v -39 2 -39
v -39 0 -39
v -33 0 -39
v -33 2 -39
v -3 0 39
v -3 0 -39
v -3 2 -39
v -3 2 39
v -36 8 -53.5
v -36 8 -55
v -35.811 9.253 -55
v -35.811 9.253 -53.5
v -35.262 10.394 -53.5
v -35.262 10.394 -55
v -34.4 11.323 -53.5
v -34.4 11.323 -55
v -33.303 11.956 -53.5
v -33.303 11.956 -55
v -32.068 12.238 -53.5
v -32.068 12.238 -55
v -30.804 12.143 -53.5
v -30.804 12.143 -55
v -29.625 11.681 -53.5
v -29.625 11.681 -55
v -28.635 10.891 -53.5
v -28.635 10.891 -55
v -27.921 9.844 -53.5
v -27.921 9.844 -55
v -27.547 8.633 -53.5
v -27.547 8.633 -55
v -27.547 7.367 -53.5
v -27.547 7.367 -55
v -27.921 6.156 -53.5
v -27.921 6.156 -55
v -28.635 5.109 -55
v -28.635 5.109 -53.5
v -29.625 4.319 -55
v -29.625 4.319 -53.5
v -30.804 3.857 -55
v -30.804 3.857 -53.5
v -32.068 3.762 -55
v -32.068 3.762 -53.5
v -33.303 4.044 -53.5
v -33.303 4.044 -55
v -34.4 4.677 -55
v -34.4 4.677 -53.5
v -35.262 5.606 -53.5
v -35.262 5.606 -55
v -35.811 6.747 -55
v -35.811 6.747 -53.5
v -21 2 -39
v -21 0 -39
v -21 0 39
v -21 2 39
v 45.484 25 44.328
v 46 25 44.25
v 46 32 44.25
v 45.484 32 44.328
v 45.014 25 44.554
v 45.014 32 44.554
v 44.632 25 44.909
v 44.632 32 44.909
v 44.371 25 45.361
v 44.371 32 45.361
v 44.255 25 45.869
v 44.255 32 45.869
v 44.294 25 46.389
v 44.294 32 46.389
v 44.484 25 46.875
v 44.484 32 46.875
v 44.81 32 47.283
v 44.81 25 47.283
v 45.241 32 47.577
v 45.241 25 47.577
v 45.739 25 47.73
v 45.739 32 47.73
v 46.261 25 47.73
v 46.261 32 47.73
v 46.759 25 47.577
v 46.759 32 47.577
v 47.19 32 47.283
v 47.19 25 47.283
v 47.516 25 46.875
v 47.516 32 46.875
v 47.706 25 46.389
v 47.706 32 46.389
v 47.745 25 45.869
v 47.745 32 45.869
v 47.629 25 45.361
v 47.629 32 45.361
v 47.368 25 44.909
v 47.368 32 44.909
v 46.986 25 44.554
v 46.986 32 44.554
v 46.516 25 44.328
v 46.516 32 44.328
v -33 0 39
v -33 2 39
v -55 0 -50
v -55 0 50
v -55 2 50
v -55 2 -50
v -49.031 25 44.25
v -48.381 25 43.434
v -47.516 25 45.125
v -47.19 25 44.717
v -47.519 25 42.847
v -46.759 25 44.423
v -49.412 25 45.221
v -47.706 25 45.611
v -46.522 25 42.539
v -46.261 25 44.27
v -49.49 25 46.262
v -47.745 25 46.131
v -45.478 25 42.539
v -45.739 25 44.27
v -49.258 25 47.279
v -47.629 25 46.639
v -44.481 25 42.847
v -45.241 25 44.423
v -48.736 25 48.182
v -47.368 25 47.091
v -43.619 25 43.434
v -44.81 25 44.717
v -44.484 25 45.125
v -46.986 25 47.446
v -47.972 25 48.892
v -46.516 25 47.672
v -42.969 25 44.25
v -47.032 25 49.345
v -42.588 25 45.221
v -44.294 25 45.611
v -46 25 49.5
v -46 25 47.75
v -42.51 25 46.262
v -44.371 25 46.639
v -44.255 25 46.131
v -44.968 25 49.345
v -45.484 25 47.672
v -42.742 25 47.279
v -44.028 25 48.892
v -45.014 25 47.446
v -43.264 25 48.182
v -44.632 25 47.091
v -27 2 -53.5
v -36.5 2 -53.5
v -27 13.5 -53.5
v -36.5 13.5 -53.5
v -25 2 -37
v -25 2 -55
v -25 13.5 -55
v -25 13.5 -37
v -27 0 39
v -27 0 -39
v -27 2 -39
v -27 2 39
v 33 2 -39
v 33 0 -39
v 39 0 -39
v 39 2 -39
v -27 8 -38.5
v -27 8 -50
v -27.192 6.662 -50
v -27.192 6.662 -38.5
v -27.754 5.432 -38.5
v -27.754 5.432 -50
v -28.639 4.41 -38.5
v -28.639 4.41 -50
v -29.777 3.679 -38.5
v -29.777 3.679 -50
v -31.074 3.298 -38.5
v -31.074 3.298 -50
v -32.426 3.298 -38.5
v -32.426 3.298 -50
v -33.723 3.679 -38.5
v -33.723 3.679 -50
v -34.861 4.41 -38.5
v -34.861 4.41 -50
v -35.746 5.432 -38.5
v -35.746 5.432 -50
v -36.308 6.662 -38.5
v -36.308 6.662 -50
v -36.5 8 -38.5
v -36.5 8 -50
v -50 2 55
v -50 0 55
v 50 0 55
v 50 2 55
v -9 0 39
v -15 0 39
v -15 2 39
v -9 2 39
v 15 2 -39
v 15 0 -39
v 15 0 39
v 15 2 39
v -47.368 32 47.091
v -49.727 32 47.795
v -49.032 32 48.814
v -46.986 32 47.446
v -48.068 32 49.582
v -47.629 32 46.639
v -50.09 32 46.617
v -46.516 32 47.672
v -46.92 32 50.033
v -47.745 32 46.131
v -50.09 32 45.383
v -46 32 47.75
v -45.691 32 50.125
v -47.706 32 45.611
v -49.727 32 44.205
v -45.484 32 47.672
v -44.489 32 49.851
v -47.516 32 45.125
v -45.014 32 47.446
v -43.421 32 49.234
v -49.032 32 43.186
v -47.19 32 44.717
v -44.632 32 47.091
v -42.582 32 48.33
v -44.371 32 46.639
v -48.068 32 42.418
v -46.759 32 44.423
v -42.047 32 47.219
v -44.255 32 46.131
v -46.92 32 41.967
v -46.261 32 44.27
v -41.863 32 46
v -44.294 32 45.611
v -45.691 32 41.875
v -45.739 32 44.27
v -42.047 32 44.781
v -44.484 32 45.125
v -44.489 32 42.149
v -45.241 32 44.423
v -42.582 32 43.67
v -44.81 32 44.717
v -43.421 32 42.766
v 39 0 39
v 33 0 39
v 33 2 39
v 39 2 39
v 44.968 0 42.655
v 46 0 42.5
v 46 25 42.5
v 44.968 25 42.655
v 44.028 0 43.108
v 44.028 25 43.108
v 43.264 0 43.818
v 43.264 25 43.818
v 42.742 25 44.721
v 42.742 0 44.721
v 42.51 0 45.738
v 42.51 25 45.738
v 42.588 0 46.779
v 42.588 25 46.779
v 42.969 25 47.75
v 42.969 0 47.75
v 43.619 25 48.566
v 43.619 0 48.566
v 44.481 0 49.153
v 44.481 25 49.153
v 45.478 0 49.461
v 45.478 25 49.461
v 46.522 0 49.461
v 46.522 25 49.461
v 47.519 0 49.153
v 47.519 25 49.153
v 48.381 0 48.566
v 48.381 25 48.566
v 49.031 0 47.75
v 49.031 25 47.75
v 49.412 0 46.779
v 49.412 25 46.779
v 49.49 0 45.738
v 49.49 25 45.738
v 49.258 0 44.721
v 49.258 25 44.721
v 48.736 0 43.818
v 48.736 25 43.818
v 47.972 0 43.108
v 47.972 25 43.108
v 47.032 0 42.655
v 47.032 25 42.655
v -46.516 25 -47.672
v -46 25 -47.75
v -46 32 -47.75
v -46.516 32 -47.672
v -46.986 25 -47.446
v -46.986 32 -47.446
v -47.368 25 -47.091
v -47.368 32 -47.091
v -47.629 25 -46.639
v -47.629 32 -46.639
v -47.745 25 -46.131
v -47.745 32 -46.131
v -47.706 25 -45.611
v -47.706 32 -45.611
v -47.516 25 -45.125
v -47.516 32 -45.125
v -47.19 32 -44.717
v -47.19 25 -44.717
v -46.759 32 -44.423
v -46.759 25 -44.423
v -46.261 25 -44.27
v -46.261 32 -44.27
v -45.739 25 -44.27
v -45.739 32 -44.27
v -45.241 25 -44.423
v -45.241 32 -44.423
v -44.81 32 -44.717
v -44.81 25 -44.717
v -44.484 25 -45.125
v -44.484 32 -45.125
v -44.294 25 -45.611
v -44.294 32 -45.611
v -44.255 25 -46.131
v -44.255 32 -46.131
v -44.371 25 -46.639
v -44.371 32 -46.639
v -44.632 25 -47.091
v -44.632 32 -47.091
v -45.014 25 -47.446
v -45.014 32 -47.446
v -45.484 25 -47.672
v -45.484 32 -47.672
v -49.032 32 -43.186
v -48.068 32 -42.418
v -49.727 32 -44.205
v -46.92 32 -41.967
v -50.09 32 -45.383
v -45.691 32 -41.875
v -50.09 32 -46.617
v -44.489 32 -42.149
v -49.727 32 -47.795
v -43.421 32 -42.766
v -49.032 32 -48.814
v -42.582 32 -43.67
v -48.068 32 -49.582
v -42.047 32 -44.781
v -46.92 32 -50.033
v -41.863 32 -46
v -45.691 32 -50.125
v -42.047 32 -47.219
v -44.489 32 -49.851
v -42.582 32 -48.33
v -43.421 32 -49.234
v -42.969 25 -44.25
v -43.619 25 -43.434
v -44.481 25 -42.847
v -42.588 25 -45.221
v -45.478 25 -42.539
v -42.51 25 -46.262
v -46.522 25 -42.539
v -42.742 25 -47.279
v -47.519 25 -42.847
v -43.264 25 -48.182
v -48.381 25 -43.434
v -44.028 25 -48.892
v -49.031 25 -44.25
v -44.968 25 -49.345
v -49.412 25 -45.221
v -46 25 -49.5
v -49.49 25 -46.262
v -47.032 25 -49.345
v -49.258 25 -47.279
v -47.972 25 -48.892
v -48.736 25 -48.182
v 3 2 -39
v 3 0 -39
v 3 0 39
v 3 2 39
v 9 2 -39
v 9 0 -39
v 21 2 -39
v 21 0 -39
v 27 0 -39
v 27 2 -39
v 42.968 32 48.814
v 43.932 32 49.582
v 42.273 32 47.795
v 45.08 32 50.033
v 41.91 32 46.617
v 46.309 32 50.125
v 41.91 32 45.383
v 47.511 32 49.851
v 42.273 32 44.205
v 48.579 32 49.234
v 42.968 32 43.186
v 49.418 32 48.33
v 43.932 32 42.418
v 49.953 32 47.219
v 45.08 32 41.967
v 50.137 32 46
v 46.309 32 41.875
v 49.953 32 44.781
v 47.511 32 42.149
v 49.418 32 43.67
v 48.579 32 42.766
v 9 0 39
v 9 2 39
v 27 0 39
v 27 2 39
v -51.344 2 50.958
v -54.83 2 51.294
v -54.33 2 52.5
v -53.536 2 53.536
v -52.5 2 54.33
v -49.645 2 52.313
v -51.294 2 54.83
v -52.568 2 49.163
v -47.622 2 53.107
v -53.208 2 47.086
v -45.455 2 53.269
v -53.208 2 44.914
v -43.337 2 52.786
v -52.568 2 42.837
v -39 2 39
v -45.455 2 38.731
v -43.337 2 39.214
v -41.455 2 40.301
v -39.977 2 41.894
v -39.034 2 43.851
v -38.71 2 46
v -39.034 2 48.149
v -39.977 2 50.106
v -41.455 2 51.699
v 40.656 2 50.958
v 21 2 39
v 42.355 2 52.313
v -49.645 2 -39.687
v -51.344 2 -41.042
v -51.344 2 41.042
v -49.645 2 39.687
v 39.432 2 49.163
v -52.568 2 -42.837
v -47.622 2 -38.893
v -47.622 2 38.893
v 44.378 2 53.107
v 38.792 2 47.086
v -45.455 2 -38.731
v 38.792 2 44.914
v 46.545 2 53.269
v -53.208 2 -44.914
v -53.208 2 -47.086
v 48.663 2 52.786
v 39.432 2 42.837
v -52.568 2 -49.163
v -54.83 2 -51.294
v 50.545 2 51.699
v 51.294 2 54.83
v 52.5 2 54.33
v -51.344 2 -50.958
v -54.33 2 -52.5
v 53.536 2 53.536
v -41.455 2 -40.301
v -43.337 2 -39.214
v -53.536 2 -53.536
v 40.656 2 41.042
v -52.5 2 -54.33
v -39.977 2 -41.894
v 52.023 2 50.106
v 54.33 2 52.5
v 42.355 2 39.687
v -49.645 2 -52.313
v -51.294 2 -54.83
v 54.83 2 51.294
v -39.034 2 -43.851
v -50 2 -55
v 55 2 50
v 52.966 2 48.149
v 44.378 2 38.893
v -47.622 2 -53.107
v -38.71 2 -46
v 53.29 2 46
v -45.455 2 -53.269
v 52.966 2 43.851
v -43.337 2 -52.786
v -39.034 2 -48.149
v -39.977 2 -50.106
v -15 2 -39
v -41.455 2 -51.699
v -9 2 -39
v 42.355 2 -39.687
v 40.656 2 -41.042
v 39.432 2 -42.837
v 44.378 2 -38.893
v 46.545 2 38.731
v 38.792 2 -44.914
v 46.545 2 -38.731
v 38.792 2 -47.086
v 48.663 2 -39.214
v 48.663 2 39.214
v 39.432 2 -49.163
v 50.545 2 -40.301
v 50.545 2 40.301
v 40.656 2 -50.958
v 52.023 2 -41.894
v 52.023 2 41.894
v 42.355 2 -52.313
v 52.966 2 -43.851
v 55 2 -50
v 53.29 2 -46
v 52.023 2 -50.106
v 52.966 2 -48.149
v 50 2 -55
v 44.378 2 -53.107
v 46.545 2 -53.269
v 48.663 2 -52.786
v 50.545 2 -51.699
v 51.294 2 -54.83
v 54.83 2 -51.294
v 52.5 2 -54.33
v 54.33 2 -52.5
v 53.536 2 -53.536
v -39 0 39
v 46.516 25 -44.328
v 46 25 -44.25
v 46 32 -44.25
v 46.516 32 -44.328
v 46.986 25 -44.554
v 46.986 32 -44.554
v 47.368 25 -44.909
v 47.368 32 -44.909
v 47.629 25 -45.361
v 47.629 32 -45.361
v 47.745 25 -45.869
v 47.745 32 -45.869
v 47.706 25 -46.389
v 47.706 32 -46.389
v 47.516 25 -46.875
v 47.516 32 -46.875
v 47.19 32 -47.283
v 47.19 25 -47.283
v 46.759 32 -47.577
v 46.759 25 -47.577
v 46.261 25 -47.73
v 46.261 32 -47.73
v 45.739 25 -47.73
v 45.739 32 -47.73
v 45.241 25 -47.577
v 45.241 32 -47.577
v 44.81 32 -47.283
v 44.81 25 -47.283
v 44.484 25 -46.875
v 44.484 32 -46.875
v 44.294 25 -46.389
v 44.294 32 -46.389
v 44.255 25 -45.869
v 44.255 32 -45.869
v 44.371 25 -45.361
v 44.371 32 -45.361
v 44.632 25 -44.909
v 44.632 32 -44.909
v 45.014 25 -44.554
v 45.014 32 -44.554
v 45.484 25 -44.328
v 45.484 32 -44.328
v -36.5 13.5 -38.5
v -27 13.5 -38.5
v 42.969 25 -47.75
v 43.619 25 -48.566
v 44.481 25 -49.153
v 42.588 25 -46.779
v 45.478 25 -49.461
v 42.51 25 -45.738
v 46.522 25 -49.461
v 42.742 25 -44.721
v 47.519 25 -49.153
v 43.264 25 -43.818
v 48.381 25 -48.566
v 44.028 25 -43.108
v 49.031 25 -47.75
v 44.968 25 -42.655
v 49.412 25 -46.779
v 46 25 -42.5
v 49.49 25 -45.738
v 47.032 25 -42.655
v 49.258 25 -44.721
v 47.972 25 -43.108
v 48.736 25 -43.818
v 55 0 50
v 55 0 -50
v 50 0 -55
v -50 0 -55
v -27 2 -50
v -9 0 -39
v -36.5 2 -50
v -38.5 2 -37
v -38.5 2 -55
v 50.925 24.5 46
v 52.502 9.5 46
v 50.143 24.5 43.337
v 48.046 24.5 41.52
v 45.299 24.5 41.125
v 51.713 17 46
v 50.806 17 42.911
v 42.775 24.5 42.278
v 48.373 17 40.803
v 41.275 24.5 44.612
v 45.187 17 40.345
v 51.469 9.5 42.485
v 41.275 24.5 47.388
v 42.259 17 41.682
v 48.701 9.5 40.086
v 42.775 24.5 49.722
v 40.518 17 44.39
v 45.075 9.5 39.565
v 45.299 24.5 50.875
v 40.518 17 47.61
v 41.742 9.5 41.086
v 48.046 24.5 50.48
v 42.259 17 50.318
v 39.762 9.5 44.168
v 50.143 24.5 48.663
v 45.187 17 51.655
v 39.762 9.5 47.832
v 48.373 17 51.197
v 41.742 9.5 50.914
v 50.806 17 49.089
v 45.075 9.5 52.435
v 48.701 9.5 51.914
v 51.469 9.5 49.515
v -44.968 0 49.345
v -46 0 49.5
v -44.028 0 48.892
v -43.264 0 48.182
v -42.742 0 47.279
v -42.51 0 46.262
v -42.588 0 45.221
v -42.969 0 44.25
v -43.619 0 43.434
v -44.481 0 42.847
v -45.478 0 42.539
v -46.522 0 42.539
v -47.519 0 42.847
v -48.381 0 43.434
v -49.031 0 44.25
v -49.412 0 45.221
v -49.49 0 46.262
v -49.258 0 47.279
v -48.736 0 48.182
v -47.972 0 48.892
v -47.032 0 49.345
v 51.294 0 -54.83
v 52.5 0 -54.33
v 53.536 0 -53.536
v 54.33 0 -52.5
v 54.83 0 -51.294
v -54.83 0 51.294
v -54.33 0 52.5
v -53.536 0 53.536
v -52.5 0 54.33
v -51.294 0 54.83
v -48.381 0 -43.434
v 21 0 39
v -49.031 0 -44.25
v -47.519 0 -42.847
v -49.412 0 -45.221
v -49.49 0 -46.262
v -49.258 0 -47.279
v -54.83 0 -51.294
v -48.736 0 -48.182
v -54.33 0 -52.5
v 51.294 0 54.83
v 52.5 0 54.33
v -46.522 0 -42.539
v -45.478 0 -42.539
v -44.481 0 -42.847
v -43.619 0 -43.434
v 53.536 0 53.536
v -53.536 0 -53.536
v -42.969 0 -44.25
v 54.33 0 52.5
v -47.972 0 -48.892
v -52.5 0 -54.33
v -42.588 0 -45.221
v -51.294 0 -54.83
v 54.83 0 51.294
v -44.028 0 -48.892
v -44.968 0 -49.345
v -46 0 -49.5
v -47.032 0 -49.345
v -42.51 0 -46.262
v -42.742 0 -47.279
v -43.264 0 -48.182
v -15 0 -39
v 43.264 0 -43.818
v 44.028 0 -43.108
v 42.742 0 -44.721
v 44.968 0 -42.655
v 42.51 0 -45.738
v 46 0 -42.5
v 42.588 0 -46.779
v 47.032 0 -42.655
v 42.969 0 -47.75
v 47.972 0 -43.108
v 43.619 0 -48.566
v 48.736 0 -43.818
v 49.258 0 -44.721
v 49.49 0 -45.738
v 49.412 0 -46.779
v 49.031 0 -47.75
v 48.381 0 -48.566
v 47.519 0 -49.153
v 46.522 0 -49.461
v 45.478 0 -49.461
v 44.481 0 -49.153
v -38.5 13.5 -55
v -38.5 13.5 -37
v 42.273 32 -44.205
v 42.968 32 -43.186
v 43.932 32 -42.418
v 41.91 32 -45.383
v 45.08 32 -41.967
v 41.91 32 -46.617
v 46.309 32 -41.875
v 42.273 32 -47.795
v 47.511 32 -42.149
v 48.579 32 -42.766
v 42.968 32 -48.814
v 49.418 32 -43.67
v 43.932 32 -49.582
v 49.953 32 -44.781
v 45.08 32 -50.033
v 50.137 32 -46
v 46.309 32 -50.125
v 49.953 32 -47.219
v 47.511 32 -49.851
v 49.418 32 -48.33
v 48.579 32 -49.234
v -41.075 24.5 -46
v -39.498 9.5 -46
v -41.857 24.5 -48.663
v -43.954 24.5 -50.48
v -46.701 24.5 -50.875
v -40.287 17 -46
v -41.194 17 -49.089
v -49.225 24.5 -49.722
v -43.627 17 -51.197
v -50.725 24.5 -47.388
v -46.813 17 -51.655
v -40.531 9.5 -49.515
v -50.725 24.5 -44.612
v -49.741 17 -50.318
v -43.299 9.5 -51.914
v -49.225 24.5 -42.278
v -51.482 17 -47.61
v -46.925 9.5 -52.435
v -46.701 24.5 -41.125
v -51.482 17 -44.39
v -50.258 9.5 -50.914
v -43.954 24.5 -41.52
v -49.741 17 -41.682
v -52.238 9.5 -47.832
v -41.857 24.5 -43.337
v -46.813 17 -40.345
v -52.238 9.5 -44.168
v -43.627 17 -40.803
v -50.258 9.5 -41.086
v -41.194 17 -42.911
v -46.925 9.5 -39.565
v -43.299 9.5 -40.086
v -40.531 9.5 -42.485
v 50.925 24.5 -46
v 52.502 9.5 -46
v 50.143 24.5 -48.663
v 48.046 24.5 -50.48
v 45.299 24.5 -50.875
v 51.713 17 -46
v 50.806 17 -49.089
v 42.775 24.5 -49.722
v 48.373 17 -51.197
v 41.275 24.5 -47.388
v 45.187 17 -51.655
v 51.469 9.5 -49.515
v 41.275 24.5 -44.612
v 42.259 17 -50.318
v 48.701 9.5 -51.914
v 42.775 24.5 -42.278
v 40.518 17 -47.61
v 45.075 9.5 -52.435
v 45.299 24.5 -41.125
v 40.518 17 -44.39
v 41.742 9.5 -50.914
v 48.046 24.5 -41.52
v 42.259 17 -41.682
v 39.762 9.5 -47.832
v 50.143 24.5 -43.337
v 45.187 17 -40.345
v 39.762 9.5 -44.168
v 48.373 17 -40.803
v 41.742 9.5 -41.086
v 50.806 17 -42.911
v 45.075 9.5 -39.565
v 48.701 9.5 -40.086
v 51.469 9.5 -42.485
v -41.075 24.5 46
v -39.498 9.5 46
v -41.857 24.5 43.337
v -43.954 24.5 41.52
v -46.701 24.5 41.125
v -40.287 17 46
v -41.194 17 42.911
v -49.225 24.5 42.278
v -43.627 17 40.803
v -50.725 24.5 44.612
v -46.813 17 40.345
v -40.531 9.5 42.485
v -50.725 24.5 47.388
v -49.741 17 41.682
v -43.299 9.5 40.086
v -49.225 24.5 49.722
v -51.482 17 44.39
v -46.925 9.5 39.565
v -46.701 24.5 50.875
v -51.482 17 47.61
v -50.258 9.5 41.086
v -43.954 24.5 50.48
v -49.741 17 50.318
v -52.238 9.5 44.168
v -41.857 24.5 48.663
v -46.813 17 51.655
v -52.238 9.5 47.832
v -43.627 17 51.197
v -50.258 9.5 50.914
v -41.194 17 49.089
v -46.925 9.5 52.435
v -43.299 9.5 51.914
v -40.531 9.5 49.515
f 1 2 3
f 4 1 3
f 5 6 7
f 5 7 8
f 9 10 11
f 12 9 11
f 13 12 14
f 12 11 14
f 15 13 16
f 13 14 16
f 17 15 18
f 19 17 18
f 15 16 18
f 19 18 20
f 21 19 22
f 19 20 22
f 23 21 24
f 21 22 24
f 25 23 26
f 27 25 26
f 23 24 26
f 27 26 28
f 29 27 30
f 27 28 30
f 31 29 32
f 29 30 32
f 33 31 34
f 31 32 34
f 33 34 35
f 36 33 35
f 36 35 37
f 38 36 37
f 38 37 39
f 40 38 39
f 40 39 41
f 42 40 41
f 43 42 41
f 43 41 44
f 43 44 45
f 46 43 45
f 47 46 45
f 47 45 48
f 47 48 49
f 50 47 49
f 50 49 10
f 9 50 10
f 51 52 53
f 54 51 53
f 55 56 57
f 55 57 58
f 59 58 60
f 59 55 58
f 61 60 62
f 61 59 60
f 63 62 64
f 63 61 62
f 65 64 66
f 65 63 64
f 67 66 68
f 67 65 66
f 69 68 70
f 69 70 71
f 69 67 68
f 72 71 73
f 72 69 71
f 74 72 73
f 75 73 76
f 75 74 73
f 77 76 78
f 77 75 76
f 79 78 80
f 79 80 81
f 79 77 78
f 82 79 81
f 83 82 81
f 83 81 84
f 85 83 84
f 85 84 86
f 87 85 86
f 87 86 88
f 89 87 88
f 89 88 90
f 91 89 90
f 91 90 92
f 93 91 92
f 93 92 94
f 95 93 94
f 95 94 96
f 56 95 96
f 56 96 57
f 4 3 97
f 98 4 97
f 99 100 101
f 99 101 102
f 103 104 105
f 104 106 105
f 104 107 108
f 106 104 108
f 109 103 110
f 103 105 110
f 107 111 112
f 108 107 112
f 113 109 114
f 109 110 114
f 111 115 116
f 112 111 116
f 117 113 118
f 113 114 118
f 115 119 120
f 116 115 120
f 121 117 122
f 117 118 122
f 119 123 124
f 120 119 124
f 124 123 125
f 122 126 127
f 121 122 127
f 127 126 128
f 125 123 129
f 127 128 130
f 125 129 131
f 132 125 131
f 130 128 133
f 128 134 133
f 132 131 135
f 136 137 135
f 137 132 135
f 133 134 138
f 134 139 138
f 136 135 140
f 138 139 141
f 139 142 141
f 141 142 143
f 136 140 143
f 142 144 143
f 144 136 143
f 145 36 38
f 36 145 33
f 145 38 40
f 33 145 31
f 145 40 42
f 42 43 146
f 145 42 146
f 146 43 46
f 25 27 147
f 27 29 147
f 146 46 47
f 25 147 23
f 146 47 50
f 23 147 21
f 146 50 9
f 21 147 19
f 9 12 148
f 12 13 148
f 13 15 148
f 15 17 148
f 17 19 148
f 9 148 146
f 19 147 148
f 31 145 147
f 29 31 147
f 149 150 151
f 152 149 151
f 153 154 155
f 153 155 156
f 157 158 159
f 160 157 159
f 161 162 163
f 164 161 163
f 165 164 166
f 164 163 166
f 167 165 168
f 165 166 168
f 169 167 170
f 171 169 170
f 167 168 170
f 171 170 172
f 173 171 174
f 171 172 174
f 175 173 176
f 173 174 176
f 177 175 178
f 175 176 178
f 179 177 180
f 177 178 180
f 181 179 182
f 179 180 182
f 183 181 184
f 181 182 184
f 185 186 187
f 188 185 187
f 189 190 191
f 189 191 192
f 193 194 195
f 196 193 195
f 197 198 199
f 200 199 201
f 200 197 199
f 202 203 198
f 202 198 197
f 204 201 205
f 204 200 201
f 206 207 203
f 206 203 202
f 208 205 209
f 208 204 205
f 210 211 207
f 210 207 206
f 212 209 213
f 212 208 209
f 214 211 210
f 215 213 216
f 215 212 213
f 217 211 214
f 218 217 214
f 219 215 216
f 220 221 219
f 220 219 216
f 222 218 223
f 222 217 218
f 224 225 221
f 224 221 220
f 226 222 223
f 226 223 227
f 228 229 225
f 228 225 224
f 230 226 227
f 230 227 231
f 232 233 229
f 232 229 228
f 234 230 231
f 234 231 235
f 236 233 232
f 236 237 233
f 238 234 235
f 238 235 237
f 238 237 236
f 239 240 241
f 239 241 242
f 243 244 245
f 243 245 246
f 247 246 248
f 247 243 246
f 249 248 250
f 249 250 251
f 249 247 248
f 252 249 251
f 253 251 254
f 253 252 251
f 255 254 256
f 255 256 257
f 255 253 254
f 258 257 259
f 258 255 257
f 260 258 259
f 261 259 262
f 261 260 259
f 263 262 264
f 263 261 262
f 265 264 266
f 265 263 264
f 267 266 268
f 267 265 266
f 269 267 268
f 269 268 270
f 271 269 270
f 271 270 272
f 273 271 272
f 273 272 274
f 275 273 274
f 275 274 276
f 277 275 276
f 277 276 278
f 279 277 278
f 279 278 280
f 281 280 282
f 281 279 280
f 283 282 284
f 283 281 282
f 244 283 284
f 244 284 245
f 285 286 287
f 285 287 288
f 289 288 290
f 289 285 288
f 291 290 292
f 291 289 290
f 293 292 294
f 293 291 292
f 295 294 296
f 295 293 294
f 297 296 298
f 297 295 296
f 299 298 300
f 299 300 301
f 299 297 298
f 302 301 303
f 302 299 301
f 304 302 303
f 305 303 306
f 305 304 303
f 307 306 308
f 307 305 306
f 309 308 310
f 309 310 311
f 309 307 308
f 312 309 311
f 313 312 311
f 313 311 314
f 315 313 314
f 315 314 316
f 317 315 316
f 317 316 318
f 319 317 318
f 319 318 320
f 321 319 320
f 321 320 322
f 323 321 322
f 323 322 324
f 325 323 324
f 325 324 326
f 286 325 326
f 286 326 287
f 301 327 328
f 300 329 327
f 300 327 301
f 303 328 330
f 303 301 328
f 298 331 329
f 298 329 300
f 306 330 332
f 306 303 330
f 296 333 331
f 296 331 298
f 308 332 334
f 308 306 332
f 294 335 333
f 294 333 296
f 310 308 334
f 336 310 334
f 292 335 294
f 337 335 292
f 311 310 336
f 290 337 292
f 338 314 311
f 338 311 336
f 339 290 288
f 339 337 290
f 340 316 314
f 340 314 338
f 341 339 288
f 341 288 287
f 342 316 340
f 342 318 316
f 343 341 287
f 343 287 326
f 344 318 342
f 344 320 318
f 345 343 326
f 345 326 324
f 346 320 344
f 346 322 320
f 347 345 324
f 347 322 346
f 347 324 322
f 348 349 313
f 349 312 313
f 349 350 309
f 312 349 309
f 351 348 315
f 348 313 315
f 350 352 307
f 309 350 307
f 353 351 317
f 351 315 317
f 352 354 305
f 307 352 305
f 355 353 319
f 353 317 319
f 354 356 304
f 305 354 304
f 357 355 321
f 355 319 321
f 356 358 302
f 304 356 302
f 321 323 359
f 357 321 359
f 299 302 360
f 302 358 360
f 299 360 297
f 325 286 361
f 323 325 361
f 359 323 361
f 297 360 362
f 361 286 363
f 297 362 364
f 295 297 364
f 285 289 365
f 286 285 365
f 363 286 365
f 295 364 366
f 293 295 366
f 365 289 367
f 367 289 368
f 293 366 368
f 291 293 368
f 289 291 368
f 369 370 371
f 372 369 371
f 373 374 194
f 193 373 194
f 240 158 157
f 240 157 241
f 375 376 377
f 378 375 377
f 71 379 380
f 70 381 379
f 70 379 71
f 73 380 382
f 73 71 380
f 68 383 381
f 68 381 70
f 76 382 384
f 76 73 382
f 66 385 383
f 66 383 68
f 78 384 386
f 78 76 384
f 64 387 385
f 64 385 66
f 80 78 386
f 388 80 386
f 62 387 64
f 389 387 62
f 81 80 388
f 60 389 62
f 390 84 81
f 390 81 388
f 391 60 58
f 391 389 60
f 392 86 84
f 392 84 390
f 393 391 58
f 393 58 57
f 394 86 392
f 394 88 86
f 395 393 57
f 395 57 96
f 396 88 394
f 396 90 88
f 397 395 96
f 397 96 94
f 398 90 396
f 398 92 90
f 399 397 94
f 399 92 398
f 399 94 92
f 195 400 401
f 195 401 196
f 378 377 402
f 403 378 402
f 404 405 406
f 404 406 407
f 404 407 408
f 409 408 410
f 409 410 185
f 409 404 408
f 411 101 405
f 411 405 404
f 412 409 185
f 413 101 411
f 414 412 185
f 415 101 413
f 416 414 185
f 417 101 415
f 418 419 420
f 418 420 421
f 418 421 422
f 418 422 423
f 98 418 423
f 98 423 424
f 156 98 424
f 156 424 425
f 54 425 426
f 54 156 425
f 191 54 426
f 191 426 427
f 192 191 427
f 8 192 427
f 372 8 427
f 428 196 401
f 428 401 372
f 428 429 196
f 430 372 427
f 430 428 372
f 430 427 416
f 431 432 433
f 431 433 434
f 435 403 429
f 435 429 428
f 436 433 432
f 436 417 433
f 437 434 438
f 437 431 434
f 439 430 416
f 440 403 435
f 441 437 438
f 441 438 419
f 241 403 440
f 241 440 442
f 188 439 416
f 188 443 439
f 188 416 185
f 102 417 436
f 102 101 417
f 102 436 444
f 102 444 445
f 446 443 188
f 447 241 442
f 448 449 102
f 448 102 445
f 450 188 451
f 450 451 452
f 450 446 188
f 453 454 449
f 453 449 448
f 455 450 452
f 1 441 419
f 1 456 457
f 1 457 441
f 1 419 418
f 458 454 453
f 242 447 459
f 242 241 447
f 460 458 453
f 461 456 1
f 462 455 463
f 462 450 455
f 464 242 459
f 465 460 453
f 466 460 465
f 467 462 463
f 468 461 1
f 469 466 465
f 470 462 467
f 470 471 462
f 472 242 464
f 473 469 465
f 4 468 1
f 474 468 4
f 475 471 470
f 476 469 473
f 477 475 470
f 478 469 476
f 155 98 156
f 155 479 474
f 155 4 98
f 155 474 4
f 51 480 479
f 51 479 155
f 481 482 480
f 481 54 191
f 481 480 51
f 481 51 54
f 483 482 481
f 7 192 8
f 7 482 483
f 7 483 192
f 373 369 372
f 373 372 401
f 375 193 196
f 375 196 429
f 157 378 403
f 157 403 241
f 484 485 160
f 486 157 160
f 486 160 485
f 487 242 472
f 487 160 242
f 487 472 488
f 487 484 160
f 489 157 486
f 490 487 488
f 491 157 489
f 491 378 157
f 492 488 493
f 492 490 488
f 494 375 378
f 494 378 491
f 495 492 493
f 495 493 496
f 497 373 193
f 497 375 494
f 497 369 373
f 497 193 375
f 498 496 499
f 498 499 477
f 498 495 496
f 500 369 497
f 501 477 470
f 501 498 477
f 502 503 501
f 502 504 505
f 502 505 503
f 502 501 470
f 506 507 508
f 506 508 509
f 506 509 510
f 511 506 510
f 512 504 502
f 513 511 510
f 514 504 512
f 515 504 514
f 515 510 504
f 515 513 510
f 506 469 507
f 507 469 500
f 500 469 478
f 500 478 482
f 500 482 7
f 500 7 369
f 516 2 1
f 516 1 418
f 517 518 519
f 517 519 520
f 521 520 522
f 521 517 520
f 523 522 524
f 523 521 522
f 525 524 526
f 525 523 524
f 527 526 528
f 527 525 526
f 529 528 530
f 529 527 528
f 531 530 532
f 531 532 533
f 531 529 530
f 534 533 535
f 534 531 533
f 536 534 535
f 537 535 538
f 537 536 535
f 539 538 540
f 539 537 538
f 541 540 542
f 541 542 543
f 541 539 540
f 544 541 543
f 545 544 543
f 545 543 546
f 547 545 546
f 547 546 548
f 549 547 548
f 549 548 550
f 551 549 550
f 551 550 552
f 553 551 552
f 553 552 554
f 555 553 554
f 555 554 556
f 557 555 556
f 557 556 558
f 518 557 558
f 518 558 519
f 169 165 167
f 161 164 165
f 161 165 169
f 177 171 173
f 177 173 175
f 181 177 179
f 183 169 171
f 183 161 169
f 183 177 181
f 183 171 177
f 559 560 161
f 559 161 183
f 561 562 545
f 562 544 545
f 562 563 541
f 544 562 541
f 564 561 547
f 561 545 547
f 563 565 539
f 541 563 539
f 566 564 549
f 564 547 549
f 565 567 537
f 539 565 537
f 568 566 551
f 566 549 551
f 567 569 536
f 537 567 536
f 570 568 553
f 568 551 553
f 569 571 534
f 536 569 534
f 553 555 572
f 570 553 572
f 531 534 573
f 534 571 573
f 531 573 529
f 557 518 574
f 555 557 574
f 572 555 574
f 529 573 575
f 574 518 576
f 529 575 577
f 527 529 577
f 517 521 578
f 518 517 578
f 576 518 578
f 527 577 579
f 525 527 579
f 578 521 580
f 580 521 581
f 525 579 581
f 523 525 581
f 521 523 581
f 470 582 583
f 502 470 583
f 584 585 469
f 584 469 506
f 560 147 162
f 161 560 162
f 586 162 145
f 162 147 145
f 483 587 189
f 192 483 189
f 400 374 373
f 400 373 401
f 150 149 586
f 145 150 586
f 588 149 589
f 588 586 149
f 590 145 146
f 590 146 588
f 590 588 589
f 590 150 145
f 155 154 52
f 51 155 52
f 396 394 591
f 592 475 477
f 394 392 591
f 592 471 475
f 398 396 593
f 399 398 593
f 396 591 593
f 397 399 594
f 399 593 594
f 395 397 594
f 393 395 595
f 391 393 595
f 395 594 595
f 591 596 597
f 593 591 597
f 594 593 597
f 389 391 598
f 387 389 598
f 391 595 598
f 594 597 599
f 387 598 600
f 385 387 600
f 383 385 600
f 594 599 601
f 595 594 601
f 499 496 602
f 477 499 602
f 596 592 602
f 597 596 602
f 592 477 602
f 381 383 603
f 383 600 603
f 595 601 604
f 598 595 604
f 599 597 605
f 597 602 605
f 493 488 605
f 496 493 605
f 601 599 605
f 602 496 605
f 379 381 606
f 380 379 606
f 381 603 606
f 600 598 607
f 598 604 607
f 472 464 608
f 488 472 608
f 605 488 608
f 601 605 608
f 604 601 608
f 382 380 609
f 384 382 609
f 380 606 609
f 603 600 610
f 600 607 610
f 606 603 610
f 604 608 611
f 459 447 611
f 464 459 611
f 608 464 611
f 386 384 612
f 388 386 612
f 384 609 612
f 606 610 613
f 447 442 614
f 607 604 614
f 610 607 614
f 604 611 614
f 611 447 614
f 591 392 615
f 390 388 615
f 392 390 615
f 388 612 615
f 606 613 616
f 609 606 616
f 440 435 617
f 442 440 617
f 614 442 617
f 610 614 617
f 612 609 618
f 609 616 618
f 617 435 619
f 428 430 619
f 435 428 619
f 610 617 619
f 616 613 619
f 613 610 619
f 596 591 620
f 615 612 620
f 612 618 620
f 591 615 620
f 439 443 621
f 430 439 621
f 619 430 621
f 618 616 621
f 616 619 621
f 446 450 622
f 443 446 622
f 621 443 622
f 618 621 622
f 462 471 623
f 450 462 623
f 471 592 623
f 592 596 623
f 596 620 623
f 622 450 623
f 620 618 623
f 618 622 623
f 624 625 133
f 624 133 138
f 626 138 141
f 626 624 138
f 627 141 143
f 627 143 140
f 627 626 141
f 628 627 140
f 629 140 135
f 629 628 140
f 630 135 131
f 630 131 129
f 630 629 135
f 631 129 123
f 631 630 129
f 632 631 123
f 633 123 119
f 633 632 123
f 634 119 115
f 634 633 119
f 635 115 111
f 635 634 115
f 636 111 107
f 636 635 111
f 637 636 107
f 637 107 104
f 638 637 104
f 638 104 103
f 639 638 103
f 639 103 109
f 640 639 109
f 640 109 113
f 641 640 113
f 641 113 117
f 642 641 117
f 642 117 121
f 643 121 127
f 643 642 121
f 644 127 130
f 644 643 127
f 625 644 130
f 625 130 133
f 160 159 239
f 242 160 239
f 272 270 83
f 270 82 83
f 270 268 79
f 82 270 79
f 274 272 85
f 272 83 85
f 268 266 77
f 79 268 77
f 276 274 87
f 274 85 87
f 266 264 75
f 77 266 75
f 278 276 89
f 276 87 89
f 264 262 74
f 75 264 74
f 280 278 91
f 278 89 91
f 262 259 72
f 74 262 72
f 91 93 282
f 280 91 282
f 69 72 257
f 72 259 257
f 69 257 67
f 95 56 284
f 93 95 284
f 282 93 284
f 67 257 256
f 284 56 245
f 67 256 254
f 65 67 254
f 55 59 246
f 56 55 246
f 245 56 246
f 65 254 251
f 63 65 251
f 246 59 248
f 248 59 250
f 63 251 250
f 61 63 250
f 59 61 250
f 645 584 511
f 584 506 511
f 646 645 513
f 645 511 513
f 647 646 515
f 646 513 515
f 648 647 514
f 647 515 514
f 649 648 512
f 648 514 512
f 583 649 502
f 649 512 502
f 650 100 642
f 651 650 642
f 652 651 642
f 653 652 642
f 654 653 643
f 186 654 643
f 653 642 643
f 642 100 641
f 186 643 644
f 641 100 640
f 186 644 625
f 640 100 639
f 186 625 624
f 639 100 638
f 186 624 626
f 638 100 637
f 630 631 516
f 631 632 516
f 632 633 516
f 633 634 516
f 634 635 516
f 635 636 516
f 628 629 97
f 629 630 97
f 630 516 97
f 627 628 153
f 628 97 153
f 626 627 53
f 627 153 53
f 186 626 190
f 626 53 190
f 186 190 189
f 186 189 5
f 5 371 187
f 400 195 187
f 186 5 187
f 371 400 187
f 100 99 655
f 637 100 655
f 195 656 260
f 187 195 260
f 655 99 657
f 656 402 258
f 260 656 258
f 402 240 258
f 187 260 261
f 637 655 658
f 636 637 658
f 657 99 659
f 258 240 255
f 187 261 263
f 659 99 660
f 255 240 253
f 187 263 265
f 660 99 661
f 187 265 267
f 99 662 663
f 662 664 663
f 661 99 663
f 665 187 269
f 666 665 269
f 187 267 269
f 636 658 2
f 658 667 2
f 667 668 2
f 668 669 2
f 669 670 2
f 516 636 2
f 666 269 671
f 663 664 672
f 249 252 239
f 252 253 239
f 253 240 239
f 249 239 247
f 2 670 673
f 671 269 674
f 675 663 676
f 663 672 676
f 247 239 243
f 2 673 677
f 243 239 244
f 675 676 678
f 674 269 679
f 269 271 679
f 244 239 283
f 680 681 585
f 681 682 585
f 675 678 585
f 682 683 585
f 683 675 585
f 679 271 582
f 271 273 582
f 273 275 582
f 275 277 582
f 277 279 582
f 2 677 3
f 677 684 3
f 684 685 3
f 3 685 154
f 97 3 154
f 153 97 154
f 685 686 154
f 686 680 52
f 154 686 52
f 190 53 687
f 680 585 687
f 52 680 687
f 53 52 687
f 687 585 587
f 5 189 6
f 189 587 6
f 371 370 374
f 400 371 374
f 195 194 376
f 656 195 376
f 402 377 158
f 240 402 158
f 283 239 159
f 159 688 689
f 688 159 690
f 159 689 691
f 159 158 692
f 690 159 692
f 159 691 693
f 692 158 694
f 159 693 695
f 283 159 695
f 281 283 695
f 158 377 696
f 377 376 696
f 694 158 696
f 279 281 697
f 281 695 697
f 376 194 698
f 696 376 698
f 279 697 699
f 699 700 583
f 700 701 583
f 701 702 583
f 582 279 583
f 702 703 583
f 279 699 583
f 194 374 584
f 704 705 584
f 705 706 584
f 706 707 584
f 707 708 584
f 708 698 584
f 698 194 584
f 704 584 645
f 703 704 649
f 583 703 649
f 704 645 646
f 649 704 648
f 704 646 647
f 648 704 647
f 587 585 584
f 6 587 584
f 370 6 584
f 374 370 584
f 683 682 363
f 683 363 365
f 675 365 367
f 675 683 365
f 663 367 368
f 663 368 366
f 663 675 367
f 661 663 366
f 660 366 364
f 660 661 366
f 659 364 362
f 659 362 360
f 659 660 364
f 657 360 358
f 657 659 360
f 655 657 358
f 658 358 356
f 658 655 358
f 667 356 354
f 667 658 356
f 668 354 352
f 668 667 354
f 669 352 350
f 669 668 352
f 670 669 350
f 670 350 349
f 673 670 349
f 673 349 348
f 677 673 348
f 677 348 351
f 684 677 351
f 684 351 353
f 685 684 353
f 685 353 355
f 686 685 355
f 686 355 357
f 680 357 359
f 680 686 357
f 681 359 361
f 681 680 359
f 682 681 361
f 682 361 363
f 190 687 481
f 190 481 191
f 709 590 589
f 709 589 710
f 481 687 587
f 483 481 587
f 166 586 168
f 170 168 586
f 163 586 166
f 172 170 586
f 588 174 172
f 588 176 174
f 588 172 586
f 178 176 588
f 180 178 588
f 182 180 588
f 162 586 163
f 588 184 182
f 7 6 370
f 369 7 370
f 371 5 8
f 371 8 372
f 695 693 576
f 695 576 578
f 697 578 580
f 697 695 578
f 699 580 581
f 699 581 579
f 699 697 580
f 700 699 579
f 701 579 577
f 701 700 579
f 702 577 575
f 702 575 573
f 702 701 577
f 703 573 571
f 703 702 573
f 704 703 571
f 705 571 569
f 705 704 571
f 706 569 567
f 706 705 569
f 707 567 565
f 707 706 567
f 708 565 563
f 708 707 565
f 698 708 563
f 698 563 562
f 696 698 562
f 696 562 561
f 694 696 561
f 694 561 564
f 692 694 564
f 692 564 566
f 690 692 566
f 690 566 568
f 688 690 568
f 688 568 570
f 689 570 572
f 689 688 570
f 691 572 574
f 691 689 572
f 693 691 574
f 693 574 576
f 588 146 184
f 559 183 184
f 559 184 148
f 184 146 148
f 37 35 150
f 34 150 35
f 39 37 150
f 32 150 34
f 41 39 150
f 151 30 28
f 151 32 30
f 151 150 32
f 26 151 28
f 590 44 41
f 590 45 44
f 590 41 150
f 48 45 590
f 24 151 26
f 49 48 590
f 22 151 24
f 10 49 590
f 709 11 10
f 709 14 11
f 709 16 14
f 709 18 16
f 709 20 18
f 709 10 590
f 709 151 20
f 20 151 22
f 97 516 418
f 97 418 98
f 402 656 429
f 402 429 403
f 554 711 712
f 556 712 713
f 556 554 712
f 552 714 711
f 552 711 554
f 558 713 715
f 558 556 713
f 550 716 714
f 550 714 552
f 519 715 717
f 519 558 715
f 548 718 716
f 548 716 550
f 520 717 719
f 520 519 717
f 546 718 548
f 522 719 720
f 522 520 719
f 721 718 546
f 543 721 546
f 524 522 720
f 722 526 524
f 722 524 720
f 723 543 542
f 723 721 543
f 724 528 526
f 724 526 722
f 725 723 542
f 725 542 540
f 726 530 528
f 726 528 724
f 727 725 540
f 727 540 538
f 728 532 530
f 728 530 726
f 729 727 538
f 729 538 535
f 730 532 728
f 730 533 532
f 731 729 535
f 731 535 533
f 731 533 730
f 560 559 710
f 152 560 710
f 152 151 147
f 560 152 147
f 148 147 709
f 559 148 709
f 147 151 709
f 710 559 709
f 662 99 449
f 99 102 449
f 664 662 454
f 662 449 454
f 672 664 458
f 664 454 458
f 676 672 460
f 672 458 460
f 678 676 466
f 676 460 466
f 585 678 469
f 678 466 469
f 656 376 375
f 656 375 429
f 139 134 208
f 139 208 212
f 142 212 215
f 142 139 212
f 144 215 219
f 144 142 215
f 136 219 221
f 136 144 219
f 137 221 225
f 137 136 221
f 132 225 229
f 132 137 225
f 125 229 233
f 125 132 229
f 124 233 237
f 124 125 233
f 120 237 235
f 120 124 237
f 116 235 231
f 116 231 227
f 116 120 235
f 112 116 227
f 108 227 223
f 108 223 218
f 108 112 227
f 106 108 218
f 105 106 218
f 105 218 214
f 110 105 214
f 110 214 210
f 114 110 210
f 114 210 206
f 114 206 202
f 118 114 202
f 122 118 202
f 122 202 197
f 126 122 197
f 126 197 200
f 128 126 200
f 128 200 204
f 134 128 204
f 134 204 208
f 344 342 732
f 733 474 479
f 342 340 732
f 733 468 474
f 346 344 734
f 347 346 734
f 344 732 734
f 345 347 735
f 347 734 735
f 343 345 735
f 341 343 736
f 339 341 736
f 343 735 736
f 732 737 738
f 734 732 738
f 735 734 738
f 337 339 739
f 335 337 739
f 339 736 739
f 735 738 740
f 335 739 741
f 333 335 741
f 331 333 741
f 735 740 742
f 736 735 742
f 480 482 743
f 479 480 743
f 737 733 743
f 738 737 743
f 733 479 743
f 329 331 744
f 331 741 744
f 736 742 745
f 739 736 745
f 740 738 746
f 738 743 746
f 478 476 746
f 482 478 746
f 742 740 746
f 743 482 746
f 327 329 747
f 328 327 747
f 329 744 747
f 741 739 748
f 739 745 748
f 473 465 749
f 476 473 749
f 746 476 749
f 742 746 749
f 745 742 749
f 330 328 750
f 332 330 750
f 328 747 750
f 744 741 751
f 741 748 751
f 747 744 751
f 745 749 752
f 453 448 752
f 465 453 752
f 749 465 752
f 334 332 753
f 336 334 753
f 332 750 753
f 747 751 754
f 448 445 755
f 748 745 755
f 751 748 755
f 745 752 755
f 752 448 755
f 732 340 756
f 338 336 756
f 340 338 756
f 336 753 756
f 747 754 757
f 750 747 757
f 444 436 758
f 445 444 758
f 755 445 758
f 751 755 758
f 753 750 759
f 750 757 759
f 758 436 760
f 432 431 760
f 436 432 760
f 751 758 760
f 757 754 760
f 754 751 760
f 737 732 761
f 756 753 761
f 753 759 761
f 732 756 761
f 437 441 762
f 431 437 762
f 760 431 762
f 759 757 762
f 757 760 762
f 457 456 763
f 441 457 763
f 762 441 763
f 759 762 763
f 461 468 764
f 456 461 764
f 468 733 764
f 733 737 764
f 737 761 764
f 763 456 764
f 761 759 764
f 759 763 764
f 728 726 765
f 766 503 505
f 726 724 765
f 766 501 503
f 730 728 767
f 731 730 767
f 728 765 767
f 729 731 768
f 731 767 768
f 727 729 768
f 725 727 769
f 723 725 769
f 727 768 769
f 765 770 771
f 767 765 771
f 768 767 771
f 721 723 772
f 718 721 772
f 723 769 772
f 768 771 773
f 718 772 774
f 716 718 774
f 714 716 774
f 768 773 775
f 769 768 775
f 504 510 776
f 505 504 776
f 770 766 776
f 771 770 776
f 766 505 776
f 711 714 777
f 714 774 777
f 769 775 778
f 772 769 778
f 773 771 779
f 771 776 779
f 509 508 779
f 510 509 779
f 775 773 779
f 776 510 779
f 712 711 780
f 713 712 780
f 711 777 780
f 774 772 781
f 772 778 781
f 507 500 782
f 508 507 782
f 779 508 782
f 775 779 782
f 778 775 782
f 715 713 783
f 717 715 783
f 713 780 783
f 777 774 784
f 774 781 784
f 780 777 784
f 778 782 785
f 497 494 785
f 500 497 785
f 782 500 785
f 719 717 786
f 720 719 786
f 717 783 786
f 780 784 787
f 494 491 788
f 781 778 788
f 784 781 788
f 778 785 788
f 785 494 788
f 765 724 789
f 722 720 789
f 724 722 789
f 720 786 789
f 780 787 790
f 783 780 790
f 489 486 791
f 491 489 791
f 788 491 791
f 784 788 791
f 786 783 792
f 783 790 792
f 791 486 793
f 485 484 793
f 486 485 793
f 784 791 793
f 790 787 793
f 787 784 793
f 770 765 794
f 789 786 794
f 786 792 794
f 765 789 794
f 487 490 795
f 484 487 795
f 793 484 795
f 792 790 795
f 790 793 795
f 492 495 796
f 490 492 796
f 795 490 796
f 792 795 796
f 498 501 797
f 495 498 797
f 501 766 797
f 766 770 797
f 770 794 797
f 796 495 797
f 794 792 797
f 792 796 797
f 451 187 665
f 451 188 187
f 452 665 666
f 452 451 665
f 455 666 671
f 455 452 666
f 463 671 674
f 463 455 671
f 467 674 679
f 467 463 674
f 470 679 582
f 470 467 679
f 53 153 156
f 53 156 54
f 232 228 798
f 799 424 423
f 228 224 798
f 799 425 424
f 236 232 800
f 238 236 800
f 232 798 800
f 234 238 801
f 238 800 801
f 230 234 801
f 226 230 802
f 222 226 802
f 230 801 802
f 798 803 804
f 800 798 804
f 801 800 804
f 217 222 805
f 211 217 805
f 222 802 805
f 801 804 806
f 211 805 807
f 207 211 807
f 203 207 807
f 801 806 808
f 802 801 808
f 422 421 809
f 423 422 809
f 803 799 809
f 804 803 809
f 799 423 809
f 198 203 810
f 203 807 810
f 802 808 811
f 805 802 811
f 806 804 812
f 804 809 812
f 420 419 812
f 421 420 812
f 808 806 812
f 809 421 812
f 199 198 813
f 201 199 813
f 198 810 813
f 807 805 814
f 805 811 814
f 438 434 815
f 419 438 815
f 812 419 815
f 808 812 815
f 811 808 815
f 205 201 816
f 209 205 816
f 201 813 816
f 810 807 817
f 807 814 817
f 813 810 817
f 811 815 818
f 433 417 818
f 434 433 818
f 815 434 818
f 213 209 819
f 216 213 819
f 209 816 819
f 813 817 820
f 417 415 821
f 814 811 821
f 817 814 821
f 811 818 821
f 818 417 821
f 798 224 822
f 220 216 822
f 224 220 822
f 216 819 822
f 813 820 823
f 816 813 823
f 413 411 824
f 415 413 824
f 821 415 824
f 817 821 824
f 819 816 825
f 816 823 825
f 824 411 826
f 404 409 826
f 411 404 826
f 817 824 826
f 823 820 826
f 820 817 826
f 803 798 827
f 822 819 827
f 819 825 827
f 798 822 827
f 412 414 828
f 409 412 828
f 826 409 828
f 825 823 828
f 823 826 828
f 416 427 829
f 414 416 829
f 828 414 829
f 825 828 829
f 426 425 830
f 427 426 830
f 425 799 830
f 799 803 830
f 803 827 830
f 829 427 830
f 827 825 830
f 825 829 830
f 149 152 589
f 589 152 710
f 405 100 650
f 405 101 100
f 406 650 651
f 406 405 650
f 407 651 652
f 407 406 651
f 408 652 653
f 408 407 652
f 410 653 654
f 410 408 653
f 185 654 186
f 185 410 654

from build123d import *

# Parameters (mm, degrees)
SKETCH_1_R                = 1.75
EXTRUDE_1_DEPTH           = 2
EXTRUDE_1_2_DEPTH         = 2
EXTRUDE_1_3_DEPTH         = 2
SKETCH_1_W                = 110
SKETCH_1_H                = 110
SKETCH_1_R_2              = 3.5
EXTRUDE_1_4_DEPTH         = 2
SKETCH_1_3_R              = 7.5
EXTRUDE_2_DEPTH           = 32
EXTRUDE_2_DRAFT           = 6
EXTRUDE_2_PROFILE_2_DEPTH = 32
EXTRUDE_2_PROFILE_2_DRAFT = 6
EXTRUDE_2_PROFILE_3_DEPTH = 32
EXTRUDE_2_PROFILE_3_DRAFT = 6
EXTRUDE_2_PROFILE_4_DEPTH = 32
EXTRUDE_2_PROFILE_4_DRAFT = 6
SKETCH_1_4_R              = 1.75
CUT_EXTRUDE_1_DEPTH       = 32
FILLET_1_R                = 5
SKETCH_2_W                = 6
SKETCH_2_H                = 78
CUT_EXTRUDE_2_DEPTH       = 85.107074613
SKETCH_3_W                = 13.5
SKETCH_3_H                = 11.5
EXTRUDE_6_DEPTH           = 18
CUT_EXTRUDE_START         = -1.5
SKETCH_3_5_R              = 4.25
CUT_EXTRUDE_4_DEPTH       = 3.5
SKETCH_3_6_R              = 4.25
CUT_EXTRUDE_5_DEPTH       = 15
SKETCH_1_5_R              = 3.5
SKETCH_1_5_R_2            = 1.75
CUT_EXTRUDE_6_DEPTH       = 25
SKETCH_3_7_R              = 4.25
CUT_EXTRUDE_7_DEPTH       = 16.5


with BuildPart() as part:
    # 草图1 → 凸台-拉伸1 (new body)
    with BuildSketch(Plane(origin=(0, 0, 0), x_dir=(1, 0, 0), z_dir=(0, 1, 0))):
        with Locations(Location((46, -46, 0), (0, 0, 270))):
            Circle(SKETCH_1_R)
    extrude(amount=EXTRUDE_1_DEPTH)


with BuildPart() as body_2:
    # 草图1 → Extrude 1 2 (new body)
    with BuildSketch(Plane(origin=(0, 0, 0), x_dir=(1, 0, 0), z_dir=(0, 1, 0))):
        with Locations(Location((46, 46, 0), (0, 0, 270))):
            Circle(SKETCH_1_R)
    extrude(amount=EXTRUDE_1_2_DEPTH)


with BuildPart() as body_3:
    # 草图1 → Extrude 1 3 (new body)
    with BuildSketch(Plane(origin=(0, 0, 0), x_dir=(1, 0, 0), z_dir=(0, 1, 0))):
        with Locations(Location((-46, 46, 0), (0, 0, 90))):
            Circle(SKETCH_1_R)
    extrude(amount=EXTRUDE_1_3_DEPTH)


with BuildPart() as body_4:
    # 草图1 → Extrude 1 4 (new body)
    with BuildSketch(Plane(origin=(0, 0, 0), x_dir=(1, 0, 0), z_dir=(0, 1, 0))):
        Rectangle(SKETCH_1_W, SKETCH_1_H)
        with Locations(Location((-46, 46, 0), (0, 0, 270))):
            Circle(SKETCH_1_R_2, mode=Mode.SUBTRACT)
        with Locations(Location((46, -46, 0), (0, 0, 270))):
            Circle(SKETCH_1_R_2, mode=Mode.SUBTRACT)
        with Locations(Location((46, 46, 0), (0, 0, 270))):
            Circle(SKETCH_1_R_2, mode=Mode.SUBTRACT)
    extrude(amount=EXTRUDE_1_4_DEPTH)


with BuildPart() as extrude_2_tool:
    # 草图1<3> → 凸台-拉伸2 (with draft: the straight prism first)
    with BuildSketch(Plane(origin=(0, 0, 0), x_dir=(1, 0, 0), z_dir=(0, 1, 0))):
        with Locations((-46, -46)):
            Circle(SKETCH_1_3_R)
    extrude(amount=EXTRUDE_2_DEPTH)
    # 凸台-拉伸2: the draft: its side faces are tilted about the plane it starts from
    extrude_2_sides = [extrude_2_tool.faces().sort_by_distance(p)[0] for p in [
        (-53.5, 16, 46),
    ]]
    draft(extrude_2_sides, Plane(origin=(0, 0, 0), x_dir=(1, 0, 0), z_dir=(0, 1, 0)), EXTRUDE_2_DRAFT)


with BuildPart() as body_4_1:
    add(body_4.part)

    # 凸台-拉伸2: add extrude_2_tool
    add(extrude_2_tool.part)


with BuildPart() as extrude_2_profile_2_tool:
    # 草图1<3> → 凸台-拉伸2 profile 2 (with draft: the straight prism first)
    with BuildSketch(Plane(origin=(0, 0, 0), x_dir=(1, 0, 0), z_dir=(0, 1, 0))):
        with Locations((46, -46)):
            Circle(SKETCH_1_3_R)
    extrude(amount=EXTRUDE_2_PROFILE_2_DEPTH)
    # 凸台-拉伸2 profile 2: the draft: its side faces are tilted about the plane it starts from
    extrude_2_profile_2_sides = [extrude_2_profile_2_tool.faces().sort_by_distance(p)[0] for p in [
        (38.5, 16, 46),
    ]]
    draft(extrude_2_profile_2_sides, Plane(origin=(0, 0, 0), x_dir=(1, 0, 0), z_dir=(0, 1, 0)), EXTRUDE_2_PROFILE_2_DRAFT)


with BuildPart() as body_4_2:
    add(body_4_1.part)

    # 凸台-拉伸2 profile 2: add extrude_2_profile_2_tool
    add(extrude_2_profile_2_tool.part)


with BuildPart() as extrude_2_profile_3_tool:
    # 草图1<3> → 凸台-拉伸2 profile 3 (with draft: the straight prism first)
    with BuildSketch(Plane(origin=(0, 0, 0), x_dir=(1, 0, 0), z_dir=(0, 1, 0))):
        with Locations((46, 46)):
            Circle(SKETCH_1_3_R)
    extrude(amount=EXTRUDE_2_PROFILE_3_DEPTH)
    # 凸台-拉伸2 profile 3: the draft: its side faces are tilted about the plane it starts from
    extrude_2_profile_3_sides = [extrude_2_profile_3_tool.faces().sort_by_distance(p)[0] for p in [
        (38.5, 16, -46),
    ]]
    draft(extrude_2_profile_3_sides, Plane(origin=(0, 0, 0), x_dir=(1, 0, 0), z_dir=(0, 1, 0)), EXTRUDE_2_PROFILE_3_DRAFT)


with BuildPart() as body_4_3:
    add(body_4_2.part)

    # 凸台-拉伸2 profile 3: add extrude_2_profile_3_tool
    add(extrude_2_profile_3_tool.part)


with BuildPart() as extrude_2_profile_4_tool:
    # 草图1<3> → 凸台-拉伸2 profile 4 (with draft: the straight prism first)
    with BuildSketch(Plane(origin=(0, 0, 0), x_dir=(1, 0, 0), z_dir=(0, 1, 0))):
        with Locations((-46, 46)):
            Circle(SKETCH_1_3_R)
    extrude(amount=EXTRUDE_2_PROFILE_4_DEPTH)
    # 凸台-拉伸2 profile 4: the draft: its side faces are tilted about the plane it starts from
    extrude_2_profile_4_sides = [extrude_2_profile_4_tool.faces().sort_by_distance(p)[0] for p in [
        (-53.5, 16, -46),
    ]]
    draft(extrude_2_profile_4_sides, Plane(origin=(0, 0, 0), x_dir=(1, 0, 0), z_dir=(0, 1, 0)), EXTRUDE_2_PROFILE_4_DRAFT)


with BuildPart() as body_4_4:
    add(body_4_3.part)

    # 凸台-拉伸2 profile 4: add extrude_2_profile_4_tool
    add(extrude_2_profile_4_tool.part)


with BuildPart() as cut_extrude_1_tool:
    # 草图1<4> → 切除-拉伸1 (new body)
    with BuildSketch(Plane(origin=(0, 0, 0), x_dir=(1, 0, 0), z_dir=(0, 1, 0))):
        with Locations(Location((-46, 46, 0), (0, 0, 90))):
            Circle(SKETCH_1_4_R)
        with Locations(Location((-46, -46, 0), (0, 0, 270))):
            Circle(SKETCH_1_4_R)
        with Locations(Location((46, -46, 0), (0, 0, 90))):
            Circle(SKETCH_1_4_R)
        with Locations(Location((46, 46, 0), (0, 0, 270))):
            Circle(SKETCH_1_4_R)
    extrude(amount=CUT_EXTRUDE_1_DEPTH)


with BuildPart() as part_1:
    add(part.part)

    # 切除-拉伸1: cut by cut_extrude_1_tool
    add(cut_extrude_1_tool.part, mode=Mode.SUBTRACT)


with BuildPart() as body_2_1:
    add(body_2.part)

    # 切除-拉伸1: cut by cut_extrude_1_tool
    add(cut_extrude_1_tool.part, mode=Mode.SUBTRACT)


with BuildPart() as body_3_1:
    add(body_3.part)

    # 切除-拉伸1: cut by cut_extrude_1_tool
    add(cut_extrude_1_tool.part, mode=Mode.SUBTRACT)


with BuildPart() as body_4_5:
    add(body_4_4.part)

    # 切除-拉伸1: cut by cut_extrude_1_tool
    add(cut_extrude_1_tool.part, mode=Mode.SUBTRACT)

    # 圆角1
    fillet_1_edges = [body_4_5.edges().sort_by_distance(p)[0] for p in [
        (55, 1, 55),
        (-55, 1, 55),
        (-55, 1, -55),
        (55, 1, -55),
    ]]
    fillet(fillet_1_edges, radius=FILLET_1_R)

    # 草图2 → 切除-拉伸2 (cut, through all)
    with BuildSketch(Plane.XZ):
        with Locations((-36, 0)):
            Rectangle(SKETCH_2_W, SKETCH_2_H)
        with Locations((-24, 0)):
            Rectangle(SKETCH_2_W, SKETCH_2_H)
        with Locations((-12, 0)):
            Rectangle(SKETCH_2_W, SKETCH_2_H)
        Rectangle(SKETCH_2_W, SKETCH_2_H)
        with Locations((12, 0)):
            Rectangle(SKETCH_2_W, SKETCH_2_H)
        with Locations((24, 0)):
            Rectangle(SKETCH_2_W, SKETCH_2_H)
        with Locations((36, 0)):
            Rectangle(SKETCH_2_W, SKETCH_2_H)
    extrude(amount=-CUT_EXTRUDE_2_DEPTH, mode=Mode.SUBTRACT)

    # 草图1<5> → 切除-拉伸6 (cut)
    # profile 1 of 4: a face of its own
    with BuildSketch(Plane(origin=(0, 0, 0), x_dir=(1, 0, 0), z_dir=(0, 1, 0))):
        with Locations(Location((-46, -46, 0), (0, 0, 270))):
            Circle(SKETCH_1_5_R)
        with Locations(Location((-46, -46, 0), (0, 0, 270))):
            Circle(SKETCH_1_5_R_2, mode=Mode.SUBTRACT)
    # profile 2 of 4: a face of its own
    with BuildSketch(Plane(origin=(0, 0, 0), x_dir=(1, 0, 0), z_dir=(0, 1, 0))):
        with Locations(Location((46, -46, 0), (0, 0, 90))):
            Circle(SKETCH_1_5_R)
    # profile 3 of 4: a face of its own
    with BuildSketch(Plane(origin=(0, 0, 0), x_dir=(1, 0, 0), z_dir=(0, 1, 0))):
        with Locations(Location((-46, 46, 0), (0, 0, 90))):
            Circle(SKETCH_1_5_R)
    # profile 4 of 4: a face of its own
    with BuildSketch(Plane(origin=(0, 0, 0), x_dir=(1, 0, 0), z_dir=(0, 1, 0))):
        with Locations(Location((46, 46, 0), (0, 0, 270))):
            Circle(SKETCH_1_5_R)
    extrude(amount=CUT_EXTRUDE_6_DEPTH, mode=Mode.SUBTRACT)


with BuildPart() as body_2_2:
    # 草图3 → 凸台-拉伸6 (new body)
    with BuildSketch(Plane(origin=(0, 0, -55), x_dir=(-1, 0, 0), z_dir=(0, 0, -1))):
        with Locations((31.75, 7.75)):
            Rectangle(SKETCH_3_W, SKETCH_3_H)
    extrude(amount=-EXTRUDE_6_DEPTH)

    # 草图3<5> → 切除-拉伸4 (cut)
    # profile 1 of 2: a face of its own
    with BuildSketch(Plane(origin=(0, 0, -55), x_dir=(-1, 0, 0), z_dir=(0, 0, -1)).offset(CUT_EXTRUDE_START)):
        with BuildLine():
            ThreePointArc((27, 8), (31.75, 3.25), (36.5, 8))
            Line((36.5, 8), (36.5, 13.5))
            Line((36.5, 13.5), (27, 13.5))
            Line((27, 13.5), (27, 8))
        make_face()
        with Locations((31.75, 8)):
            Circle(SKETCH_3_5_R, mode=Mode.SUBTRACT)
    # profile 2 of 2: a face of its own
    with BuildSketch(Plane(origin=(0, 0, -55), x_dir=(-1, 0, 0), z_dir=(0, 0, -1)).offset(CUT_EXTRUDE_START)):
        with BuildLine():
            Line((27, 2), (36.5, 2))
            Line((36.5, 2), (36.5, 8))
            ThreePointArc((36.5, 8), (31.75, 3.25), (27, 8))
            Line((27, 8), (27, 2))
        make_face()
    extrude(amount=-CUT_EXTRUDE_4_DEPTH, mode=Mode.SUBTRACT)

    # 草图3<6> → 切除-拉伸5 (cut)
    with BuildSketch(Plane(origin=(0, 0, -55), x_dir=(-1, 0, 0), z_dir=(0, 0, -1)).offset(CUT_EXTRUDE_START)):
        with BuildLine():
            ThreePointArc((27, 8), (31.75, 3.25), (36.5, 8))
            Line((36.5, 8), (36.5, 13.5))
            Line((36.5, 13.5), (27, 13.5))
            Line((27, 13.5), (27, 8))
        make_face()
        with Locations((31.75, 8)):
            Circle(SKETCH_3_6_R, mode=Mode.SUBTRACT)
    extrude(amount=-CUT_EXTRUDE_5_DEPTH, mode=Mode.SUBTRACT)

    # 草图3<7> → 切除-拉伸7 (cut)
    with BuildSketch(Plane(origin=(0, 0, -55), x_dir=(-1, 0, 0), z_dir=(0, 0, -1))):
        with Locations((31.75, 8)):
            Circle(SKETCH_3_7_R)
    extrude(amount=-CUT_EXTRUDE_7_DEPTH, mode=Mode.SUBTRACT)


solid = Compound([body_4_5.part, body_2_2.part])
